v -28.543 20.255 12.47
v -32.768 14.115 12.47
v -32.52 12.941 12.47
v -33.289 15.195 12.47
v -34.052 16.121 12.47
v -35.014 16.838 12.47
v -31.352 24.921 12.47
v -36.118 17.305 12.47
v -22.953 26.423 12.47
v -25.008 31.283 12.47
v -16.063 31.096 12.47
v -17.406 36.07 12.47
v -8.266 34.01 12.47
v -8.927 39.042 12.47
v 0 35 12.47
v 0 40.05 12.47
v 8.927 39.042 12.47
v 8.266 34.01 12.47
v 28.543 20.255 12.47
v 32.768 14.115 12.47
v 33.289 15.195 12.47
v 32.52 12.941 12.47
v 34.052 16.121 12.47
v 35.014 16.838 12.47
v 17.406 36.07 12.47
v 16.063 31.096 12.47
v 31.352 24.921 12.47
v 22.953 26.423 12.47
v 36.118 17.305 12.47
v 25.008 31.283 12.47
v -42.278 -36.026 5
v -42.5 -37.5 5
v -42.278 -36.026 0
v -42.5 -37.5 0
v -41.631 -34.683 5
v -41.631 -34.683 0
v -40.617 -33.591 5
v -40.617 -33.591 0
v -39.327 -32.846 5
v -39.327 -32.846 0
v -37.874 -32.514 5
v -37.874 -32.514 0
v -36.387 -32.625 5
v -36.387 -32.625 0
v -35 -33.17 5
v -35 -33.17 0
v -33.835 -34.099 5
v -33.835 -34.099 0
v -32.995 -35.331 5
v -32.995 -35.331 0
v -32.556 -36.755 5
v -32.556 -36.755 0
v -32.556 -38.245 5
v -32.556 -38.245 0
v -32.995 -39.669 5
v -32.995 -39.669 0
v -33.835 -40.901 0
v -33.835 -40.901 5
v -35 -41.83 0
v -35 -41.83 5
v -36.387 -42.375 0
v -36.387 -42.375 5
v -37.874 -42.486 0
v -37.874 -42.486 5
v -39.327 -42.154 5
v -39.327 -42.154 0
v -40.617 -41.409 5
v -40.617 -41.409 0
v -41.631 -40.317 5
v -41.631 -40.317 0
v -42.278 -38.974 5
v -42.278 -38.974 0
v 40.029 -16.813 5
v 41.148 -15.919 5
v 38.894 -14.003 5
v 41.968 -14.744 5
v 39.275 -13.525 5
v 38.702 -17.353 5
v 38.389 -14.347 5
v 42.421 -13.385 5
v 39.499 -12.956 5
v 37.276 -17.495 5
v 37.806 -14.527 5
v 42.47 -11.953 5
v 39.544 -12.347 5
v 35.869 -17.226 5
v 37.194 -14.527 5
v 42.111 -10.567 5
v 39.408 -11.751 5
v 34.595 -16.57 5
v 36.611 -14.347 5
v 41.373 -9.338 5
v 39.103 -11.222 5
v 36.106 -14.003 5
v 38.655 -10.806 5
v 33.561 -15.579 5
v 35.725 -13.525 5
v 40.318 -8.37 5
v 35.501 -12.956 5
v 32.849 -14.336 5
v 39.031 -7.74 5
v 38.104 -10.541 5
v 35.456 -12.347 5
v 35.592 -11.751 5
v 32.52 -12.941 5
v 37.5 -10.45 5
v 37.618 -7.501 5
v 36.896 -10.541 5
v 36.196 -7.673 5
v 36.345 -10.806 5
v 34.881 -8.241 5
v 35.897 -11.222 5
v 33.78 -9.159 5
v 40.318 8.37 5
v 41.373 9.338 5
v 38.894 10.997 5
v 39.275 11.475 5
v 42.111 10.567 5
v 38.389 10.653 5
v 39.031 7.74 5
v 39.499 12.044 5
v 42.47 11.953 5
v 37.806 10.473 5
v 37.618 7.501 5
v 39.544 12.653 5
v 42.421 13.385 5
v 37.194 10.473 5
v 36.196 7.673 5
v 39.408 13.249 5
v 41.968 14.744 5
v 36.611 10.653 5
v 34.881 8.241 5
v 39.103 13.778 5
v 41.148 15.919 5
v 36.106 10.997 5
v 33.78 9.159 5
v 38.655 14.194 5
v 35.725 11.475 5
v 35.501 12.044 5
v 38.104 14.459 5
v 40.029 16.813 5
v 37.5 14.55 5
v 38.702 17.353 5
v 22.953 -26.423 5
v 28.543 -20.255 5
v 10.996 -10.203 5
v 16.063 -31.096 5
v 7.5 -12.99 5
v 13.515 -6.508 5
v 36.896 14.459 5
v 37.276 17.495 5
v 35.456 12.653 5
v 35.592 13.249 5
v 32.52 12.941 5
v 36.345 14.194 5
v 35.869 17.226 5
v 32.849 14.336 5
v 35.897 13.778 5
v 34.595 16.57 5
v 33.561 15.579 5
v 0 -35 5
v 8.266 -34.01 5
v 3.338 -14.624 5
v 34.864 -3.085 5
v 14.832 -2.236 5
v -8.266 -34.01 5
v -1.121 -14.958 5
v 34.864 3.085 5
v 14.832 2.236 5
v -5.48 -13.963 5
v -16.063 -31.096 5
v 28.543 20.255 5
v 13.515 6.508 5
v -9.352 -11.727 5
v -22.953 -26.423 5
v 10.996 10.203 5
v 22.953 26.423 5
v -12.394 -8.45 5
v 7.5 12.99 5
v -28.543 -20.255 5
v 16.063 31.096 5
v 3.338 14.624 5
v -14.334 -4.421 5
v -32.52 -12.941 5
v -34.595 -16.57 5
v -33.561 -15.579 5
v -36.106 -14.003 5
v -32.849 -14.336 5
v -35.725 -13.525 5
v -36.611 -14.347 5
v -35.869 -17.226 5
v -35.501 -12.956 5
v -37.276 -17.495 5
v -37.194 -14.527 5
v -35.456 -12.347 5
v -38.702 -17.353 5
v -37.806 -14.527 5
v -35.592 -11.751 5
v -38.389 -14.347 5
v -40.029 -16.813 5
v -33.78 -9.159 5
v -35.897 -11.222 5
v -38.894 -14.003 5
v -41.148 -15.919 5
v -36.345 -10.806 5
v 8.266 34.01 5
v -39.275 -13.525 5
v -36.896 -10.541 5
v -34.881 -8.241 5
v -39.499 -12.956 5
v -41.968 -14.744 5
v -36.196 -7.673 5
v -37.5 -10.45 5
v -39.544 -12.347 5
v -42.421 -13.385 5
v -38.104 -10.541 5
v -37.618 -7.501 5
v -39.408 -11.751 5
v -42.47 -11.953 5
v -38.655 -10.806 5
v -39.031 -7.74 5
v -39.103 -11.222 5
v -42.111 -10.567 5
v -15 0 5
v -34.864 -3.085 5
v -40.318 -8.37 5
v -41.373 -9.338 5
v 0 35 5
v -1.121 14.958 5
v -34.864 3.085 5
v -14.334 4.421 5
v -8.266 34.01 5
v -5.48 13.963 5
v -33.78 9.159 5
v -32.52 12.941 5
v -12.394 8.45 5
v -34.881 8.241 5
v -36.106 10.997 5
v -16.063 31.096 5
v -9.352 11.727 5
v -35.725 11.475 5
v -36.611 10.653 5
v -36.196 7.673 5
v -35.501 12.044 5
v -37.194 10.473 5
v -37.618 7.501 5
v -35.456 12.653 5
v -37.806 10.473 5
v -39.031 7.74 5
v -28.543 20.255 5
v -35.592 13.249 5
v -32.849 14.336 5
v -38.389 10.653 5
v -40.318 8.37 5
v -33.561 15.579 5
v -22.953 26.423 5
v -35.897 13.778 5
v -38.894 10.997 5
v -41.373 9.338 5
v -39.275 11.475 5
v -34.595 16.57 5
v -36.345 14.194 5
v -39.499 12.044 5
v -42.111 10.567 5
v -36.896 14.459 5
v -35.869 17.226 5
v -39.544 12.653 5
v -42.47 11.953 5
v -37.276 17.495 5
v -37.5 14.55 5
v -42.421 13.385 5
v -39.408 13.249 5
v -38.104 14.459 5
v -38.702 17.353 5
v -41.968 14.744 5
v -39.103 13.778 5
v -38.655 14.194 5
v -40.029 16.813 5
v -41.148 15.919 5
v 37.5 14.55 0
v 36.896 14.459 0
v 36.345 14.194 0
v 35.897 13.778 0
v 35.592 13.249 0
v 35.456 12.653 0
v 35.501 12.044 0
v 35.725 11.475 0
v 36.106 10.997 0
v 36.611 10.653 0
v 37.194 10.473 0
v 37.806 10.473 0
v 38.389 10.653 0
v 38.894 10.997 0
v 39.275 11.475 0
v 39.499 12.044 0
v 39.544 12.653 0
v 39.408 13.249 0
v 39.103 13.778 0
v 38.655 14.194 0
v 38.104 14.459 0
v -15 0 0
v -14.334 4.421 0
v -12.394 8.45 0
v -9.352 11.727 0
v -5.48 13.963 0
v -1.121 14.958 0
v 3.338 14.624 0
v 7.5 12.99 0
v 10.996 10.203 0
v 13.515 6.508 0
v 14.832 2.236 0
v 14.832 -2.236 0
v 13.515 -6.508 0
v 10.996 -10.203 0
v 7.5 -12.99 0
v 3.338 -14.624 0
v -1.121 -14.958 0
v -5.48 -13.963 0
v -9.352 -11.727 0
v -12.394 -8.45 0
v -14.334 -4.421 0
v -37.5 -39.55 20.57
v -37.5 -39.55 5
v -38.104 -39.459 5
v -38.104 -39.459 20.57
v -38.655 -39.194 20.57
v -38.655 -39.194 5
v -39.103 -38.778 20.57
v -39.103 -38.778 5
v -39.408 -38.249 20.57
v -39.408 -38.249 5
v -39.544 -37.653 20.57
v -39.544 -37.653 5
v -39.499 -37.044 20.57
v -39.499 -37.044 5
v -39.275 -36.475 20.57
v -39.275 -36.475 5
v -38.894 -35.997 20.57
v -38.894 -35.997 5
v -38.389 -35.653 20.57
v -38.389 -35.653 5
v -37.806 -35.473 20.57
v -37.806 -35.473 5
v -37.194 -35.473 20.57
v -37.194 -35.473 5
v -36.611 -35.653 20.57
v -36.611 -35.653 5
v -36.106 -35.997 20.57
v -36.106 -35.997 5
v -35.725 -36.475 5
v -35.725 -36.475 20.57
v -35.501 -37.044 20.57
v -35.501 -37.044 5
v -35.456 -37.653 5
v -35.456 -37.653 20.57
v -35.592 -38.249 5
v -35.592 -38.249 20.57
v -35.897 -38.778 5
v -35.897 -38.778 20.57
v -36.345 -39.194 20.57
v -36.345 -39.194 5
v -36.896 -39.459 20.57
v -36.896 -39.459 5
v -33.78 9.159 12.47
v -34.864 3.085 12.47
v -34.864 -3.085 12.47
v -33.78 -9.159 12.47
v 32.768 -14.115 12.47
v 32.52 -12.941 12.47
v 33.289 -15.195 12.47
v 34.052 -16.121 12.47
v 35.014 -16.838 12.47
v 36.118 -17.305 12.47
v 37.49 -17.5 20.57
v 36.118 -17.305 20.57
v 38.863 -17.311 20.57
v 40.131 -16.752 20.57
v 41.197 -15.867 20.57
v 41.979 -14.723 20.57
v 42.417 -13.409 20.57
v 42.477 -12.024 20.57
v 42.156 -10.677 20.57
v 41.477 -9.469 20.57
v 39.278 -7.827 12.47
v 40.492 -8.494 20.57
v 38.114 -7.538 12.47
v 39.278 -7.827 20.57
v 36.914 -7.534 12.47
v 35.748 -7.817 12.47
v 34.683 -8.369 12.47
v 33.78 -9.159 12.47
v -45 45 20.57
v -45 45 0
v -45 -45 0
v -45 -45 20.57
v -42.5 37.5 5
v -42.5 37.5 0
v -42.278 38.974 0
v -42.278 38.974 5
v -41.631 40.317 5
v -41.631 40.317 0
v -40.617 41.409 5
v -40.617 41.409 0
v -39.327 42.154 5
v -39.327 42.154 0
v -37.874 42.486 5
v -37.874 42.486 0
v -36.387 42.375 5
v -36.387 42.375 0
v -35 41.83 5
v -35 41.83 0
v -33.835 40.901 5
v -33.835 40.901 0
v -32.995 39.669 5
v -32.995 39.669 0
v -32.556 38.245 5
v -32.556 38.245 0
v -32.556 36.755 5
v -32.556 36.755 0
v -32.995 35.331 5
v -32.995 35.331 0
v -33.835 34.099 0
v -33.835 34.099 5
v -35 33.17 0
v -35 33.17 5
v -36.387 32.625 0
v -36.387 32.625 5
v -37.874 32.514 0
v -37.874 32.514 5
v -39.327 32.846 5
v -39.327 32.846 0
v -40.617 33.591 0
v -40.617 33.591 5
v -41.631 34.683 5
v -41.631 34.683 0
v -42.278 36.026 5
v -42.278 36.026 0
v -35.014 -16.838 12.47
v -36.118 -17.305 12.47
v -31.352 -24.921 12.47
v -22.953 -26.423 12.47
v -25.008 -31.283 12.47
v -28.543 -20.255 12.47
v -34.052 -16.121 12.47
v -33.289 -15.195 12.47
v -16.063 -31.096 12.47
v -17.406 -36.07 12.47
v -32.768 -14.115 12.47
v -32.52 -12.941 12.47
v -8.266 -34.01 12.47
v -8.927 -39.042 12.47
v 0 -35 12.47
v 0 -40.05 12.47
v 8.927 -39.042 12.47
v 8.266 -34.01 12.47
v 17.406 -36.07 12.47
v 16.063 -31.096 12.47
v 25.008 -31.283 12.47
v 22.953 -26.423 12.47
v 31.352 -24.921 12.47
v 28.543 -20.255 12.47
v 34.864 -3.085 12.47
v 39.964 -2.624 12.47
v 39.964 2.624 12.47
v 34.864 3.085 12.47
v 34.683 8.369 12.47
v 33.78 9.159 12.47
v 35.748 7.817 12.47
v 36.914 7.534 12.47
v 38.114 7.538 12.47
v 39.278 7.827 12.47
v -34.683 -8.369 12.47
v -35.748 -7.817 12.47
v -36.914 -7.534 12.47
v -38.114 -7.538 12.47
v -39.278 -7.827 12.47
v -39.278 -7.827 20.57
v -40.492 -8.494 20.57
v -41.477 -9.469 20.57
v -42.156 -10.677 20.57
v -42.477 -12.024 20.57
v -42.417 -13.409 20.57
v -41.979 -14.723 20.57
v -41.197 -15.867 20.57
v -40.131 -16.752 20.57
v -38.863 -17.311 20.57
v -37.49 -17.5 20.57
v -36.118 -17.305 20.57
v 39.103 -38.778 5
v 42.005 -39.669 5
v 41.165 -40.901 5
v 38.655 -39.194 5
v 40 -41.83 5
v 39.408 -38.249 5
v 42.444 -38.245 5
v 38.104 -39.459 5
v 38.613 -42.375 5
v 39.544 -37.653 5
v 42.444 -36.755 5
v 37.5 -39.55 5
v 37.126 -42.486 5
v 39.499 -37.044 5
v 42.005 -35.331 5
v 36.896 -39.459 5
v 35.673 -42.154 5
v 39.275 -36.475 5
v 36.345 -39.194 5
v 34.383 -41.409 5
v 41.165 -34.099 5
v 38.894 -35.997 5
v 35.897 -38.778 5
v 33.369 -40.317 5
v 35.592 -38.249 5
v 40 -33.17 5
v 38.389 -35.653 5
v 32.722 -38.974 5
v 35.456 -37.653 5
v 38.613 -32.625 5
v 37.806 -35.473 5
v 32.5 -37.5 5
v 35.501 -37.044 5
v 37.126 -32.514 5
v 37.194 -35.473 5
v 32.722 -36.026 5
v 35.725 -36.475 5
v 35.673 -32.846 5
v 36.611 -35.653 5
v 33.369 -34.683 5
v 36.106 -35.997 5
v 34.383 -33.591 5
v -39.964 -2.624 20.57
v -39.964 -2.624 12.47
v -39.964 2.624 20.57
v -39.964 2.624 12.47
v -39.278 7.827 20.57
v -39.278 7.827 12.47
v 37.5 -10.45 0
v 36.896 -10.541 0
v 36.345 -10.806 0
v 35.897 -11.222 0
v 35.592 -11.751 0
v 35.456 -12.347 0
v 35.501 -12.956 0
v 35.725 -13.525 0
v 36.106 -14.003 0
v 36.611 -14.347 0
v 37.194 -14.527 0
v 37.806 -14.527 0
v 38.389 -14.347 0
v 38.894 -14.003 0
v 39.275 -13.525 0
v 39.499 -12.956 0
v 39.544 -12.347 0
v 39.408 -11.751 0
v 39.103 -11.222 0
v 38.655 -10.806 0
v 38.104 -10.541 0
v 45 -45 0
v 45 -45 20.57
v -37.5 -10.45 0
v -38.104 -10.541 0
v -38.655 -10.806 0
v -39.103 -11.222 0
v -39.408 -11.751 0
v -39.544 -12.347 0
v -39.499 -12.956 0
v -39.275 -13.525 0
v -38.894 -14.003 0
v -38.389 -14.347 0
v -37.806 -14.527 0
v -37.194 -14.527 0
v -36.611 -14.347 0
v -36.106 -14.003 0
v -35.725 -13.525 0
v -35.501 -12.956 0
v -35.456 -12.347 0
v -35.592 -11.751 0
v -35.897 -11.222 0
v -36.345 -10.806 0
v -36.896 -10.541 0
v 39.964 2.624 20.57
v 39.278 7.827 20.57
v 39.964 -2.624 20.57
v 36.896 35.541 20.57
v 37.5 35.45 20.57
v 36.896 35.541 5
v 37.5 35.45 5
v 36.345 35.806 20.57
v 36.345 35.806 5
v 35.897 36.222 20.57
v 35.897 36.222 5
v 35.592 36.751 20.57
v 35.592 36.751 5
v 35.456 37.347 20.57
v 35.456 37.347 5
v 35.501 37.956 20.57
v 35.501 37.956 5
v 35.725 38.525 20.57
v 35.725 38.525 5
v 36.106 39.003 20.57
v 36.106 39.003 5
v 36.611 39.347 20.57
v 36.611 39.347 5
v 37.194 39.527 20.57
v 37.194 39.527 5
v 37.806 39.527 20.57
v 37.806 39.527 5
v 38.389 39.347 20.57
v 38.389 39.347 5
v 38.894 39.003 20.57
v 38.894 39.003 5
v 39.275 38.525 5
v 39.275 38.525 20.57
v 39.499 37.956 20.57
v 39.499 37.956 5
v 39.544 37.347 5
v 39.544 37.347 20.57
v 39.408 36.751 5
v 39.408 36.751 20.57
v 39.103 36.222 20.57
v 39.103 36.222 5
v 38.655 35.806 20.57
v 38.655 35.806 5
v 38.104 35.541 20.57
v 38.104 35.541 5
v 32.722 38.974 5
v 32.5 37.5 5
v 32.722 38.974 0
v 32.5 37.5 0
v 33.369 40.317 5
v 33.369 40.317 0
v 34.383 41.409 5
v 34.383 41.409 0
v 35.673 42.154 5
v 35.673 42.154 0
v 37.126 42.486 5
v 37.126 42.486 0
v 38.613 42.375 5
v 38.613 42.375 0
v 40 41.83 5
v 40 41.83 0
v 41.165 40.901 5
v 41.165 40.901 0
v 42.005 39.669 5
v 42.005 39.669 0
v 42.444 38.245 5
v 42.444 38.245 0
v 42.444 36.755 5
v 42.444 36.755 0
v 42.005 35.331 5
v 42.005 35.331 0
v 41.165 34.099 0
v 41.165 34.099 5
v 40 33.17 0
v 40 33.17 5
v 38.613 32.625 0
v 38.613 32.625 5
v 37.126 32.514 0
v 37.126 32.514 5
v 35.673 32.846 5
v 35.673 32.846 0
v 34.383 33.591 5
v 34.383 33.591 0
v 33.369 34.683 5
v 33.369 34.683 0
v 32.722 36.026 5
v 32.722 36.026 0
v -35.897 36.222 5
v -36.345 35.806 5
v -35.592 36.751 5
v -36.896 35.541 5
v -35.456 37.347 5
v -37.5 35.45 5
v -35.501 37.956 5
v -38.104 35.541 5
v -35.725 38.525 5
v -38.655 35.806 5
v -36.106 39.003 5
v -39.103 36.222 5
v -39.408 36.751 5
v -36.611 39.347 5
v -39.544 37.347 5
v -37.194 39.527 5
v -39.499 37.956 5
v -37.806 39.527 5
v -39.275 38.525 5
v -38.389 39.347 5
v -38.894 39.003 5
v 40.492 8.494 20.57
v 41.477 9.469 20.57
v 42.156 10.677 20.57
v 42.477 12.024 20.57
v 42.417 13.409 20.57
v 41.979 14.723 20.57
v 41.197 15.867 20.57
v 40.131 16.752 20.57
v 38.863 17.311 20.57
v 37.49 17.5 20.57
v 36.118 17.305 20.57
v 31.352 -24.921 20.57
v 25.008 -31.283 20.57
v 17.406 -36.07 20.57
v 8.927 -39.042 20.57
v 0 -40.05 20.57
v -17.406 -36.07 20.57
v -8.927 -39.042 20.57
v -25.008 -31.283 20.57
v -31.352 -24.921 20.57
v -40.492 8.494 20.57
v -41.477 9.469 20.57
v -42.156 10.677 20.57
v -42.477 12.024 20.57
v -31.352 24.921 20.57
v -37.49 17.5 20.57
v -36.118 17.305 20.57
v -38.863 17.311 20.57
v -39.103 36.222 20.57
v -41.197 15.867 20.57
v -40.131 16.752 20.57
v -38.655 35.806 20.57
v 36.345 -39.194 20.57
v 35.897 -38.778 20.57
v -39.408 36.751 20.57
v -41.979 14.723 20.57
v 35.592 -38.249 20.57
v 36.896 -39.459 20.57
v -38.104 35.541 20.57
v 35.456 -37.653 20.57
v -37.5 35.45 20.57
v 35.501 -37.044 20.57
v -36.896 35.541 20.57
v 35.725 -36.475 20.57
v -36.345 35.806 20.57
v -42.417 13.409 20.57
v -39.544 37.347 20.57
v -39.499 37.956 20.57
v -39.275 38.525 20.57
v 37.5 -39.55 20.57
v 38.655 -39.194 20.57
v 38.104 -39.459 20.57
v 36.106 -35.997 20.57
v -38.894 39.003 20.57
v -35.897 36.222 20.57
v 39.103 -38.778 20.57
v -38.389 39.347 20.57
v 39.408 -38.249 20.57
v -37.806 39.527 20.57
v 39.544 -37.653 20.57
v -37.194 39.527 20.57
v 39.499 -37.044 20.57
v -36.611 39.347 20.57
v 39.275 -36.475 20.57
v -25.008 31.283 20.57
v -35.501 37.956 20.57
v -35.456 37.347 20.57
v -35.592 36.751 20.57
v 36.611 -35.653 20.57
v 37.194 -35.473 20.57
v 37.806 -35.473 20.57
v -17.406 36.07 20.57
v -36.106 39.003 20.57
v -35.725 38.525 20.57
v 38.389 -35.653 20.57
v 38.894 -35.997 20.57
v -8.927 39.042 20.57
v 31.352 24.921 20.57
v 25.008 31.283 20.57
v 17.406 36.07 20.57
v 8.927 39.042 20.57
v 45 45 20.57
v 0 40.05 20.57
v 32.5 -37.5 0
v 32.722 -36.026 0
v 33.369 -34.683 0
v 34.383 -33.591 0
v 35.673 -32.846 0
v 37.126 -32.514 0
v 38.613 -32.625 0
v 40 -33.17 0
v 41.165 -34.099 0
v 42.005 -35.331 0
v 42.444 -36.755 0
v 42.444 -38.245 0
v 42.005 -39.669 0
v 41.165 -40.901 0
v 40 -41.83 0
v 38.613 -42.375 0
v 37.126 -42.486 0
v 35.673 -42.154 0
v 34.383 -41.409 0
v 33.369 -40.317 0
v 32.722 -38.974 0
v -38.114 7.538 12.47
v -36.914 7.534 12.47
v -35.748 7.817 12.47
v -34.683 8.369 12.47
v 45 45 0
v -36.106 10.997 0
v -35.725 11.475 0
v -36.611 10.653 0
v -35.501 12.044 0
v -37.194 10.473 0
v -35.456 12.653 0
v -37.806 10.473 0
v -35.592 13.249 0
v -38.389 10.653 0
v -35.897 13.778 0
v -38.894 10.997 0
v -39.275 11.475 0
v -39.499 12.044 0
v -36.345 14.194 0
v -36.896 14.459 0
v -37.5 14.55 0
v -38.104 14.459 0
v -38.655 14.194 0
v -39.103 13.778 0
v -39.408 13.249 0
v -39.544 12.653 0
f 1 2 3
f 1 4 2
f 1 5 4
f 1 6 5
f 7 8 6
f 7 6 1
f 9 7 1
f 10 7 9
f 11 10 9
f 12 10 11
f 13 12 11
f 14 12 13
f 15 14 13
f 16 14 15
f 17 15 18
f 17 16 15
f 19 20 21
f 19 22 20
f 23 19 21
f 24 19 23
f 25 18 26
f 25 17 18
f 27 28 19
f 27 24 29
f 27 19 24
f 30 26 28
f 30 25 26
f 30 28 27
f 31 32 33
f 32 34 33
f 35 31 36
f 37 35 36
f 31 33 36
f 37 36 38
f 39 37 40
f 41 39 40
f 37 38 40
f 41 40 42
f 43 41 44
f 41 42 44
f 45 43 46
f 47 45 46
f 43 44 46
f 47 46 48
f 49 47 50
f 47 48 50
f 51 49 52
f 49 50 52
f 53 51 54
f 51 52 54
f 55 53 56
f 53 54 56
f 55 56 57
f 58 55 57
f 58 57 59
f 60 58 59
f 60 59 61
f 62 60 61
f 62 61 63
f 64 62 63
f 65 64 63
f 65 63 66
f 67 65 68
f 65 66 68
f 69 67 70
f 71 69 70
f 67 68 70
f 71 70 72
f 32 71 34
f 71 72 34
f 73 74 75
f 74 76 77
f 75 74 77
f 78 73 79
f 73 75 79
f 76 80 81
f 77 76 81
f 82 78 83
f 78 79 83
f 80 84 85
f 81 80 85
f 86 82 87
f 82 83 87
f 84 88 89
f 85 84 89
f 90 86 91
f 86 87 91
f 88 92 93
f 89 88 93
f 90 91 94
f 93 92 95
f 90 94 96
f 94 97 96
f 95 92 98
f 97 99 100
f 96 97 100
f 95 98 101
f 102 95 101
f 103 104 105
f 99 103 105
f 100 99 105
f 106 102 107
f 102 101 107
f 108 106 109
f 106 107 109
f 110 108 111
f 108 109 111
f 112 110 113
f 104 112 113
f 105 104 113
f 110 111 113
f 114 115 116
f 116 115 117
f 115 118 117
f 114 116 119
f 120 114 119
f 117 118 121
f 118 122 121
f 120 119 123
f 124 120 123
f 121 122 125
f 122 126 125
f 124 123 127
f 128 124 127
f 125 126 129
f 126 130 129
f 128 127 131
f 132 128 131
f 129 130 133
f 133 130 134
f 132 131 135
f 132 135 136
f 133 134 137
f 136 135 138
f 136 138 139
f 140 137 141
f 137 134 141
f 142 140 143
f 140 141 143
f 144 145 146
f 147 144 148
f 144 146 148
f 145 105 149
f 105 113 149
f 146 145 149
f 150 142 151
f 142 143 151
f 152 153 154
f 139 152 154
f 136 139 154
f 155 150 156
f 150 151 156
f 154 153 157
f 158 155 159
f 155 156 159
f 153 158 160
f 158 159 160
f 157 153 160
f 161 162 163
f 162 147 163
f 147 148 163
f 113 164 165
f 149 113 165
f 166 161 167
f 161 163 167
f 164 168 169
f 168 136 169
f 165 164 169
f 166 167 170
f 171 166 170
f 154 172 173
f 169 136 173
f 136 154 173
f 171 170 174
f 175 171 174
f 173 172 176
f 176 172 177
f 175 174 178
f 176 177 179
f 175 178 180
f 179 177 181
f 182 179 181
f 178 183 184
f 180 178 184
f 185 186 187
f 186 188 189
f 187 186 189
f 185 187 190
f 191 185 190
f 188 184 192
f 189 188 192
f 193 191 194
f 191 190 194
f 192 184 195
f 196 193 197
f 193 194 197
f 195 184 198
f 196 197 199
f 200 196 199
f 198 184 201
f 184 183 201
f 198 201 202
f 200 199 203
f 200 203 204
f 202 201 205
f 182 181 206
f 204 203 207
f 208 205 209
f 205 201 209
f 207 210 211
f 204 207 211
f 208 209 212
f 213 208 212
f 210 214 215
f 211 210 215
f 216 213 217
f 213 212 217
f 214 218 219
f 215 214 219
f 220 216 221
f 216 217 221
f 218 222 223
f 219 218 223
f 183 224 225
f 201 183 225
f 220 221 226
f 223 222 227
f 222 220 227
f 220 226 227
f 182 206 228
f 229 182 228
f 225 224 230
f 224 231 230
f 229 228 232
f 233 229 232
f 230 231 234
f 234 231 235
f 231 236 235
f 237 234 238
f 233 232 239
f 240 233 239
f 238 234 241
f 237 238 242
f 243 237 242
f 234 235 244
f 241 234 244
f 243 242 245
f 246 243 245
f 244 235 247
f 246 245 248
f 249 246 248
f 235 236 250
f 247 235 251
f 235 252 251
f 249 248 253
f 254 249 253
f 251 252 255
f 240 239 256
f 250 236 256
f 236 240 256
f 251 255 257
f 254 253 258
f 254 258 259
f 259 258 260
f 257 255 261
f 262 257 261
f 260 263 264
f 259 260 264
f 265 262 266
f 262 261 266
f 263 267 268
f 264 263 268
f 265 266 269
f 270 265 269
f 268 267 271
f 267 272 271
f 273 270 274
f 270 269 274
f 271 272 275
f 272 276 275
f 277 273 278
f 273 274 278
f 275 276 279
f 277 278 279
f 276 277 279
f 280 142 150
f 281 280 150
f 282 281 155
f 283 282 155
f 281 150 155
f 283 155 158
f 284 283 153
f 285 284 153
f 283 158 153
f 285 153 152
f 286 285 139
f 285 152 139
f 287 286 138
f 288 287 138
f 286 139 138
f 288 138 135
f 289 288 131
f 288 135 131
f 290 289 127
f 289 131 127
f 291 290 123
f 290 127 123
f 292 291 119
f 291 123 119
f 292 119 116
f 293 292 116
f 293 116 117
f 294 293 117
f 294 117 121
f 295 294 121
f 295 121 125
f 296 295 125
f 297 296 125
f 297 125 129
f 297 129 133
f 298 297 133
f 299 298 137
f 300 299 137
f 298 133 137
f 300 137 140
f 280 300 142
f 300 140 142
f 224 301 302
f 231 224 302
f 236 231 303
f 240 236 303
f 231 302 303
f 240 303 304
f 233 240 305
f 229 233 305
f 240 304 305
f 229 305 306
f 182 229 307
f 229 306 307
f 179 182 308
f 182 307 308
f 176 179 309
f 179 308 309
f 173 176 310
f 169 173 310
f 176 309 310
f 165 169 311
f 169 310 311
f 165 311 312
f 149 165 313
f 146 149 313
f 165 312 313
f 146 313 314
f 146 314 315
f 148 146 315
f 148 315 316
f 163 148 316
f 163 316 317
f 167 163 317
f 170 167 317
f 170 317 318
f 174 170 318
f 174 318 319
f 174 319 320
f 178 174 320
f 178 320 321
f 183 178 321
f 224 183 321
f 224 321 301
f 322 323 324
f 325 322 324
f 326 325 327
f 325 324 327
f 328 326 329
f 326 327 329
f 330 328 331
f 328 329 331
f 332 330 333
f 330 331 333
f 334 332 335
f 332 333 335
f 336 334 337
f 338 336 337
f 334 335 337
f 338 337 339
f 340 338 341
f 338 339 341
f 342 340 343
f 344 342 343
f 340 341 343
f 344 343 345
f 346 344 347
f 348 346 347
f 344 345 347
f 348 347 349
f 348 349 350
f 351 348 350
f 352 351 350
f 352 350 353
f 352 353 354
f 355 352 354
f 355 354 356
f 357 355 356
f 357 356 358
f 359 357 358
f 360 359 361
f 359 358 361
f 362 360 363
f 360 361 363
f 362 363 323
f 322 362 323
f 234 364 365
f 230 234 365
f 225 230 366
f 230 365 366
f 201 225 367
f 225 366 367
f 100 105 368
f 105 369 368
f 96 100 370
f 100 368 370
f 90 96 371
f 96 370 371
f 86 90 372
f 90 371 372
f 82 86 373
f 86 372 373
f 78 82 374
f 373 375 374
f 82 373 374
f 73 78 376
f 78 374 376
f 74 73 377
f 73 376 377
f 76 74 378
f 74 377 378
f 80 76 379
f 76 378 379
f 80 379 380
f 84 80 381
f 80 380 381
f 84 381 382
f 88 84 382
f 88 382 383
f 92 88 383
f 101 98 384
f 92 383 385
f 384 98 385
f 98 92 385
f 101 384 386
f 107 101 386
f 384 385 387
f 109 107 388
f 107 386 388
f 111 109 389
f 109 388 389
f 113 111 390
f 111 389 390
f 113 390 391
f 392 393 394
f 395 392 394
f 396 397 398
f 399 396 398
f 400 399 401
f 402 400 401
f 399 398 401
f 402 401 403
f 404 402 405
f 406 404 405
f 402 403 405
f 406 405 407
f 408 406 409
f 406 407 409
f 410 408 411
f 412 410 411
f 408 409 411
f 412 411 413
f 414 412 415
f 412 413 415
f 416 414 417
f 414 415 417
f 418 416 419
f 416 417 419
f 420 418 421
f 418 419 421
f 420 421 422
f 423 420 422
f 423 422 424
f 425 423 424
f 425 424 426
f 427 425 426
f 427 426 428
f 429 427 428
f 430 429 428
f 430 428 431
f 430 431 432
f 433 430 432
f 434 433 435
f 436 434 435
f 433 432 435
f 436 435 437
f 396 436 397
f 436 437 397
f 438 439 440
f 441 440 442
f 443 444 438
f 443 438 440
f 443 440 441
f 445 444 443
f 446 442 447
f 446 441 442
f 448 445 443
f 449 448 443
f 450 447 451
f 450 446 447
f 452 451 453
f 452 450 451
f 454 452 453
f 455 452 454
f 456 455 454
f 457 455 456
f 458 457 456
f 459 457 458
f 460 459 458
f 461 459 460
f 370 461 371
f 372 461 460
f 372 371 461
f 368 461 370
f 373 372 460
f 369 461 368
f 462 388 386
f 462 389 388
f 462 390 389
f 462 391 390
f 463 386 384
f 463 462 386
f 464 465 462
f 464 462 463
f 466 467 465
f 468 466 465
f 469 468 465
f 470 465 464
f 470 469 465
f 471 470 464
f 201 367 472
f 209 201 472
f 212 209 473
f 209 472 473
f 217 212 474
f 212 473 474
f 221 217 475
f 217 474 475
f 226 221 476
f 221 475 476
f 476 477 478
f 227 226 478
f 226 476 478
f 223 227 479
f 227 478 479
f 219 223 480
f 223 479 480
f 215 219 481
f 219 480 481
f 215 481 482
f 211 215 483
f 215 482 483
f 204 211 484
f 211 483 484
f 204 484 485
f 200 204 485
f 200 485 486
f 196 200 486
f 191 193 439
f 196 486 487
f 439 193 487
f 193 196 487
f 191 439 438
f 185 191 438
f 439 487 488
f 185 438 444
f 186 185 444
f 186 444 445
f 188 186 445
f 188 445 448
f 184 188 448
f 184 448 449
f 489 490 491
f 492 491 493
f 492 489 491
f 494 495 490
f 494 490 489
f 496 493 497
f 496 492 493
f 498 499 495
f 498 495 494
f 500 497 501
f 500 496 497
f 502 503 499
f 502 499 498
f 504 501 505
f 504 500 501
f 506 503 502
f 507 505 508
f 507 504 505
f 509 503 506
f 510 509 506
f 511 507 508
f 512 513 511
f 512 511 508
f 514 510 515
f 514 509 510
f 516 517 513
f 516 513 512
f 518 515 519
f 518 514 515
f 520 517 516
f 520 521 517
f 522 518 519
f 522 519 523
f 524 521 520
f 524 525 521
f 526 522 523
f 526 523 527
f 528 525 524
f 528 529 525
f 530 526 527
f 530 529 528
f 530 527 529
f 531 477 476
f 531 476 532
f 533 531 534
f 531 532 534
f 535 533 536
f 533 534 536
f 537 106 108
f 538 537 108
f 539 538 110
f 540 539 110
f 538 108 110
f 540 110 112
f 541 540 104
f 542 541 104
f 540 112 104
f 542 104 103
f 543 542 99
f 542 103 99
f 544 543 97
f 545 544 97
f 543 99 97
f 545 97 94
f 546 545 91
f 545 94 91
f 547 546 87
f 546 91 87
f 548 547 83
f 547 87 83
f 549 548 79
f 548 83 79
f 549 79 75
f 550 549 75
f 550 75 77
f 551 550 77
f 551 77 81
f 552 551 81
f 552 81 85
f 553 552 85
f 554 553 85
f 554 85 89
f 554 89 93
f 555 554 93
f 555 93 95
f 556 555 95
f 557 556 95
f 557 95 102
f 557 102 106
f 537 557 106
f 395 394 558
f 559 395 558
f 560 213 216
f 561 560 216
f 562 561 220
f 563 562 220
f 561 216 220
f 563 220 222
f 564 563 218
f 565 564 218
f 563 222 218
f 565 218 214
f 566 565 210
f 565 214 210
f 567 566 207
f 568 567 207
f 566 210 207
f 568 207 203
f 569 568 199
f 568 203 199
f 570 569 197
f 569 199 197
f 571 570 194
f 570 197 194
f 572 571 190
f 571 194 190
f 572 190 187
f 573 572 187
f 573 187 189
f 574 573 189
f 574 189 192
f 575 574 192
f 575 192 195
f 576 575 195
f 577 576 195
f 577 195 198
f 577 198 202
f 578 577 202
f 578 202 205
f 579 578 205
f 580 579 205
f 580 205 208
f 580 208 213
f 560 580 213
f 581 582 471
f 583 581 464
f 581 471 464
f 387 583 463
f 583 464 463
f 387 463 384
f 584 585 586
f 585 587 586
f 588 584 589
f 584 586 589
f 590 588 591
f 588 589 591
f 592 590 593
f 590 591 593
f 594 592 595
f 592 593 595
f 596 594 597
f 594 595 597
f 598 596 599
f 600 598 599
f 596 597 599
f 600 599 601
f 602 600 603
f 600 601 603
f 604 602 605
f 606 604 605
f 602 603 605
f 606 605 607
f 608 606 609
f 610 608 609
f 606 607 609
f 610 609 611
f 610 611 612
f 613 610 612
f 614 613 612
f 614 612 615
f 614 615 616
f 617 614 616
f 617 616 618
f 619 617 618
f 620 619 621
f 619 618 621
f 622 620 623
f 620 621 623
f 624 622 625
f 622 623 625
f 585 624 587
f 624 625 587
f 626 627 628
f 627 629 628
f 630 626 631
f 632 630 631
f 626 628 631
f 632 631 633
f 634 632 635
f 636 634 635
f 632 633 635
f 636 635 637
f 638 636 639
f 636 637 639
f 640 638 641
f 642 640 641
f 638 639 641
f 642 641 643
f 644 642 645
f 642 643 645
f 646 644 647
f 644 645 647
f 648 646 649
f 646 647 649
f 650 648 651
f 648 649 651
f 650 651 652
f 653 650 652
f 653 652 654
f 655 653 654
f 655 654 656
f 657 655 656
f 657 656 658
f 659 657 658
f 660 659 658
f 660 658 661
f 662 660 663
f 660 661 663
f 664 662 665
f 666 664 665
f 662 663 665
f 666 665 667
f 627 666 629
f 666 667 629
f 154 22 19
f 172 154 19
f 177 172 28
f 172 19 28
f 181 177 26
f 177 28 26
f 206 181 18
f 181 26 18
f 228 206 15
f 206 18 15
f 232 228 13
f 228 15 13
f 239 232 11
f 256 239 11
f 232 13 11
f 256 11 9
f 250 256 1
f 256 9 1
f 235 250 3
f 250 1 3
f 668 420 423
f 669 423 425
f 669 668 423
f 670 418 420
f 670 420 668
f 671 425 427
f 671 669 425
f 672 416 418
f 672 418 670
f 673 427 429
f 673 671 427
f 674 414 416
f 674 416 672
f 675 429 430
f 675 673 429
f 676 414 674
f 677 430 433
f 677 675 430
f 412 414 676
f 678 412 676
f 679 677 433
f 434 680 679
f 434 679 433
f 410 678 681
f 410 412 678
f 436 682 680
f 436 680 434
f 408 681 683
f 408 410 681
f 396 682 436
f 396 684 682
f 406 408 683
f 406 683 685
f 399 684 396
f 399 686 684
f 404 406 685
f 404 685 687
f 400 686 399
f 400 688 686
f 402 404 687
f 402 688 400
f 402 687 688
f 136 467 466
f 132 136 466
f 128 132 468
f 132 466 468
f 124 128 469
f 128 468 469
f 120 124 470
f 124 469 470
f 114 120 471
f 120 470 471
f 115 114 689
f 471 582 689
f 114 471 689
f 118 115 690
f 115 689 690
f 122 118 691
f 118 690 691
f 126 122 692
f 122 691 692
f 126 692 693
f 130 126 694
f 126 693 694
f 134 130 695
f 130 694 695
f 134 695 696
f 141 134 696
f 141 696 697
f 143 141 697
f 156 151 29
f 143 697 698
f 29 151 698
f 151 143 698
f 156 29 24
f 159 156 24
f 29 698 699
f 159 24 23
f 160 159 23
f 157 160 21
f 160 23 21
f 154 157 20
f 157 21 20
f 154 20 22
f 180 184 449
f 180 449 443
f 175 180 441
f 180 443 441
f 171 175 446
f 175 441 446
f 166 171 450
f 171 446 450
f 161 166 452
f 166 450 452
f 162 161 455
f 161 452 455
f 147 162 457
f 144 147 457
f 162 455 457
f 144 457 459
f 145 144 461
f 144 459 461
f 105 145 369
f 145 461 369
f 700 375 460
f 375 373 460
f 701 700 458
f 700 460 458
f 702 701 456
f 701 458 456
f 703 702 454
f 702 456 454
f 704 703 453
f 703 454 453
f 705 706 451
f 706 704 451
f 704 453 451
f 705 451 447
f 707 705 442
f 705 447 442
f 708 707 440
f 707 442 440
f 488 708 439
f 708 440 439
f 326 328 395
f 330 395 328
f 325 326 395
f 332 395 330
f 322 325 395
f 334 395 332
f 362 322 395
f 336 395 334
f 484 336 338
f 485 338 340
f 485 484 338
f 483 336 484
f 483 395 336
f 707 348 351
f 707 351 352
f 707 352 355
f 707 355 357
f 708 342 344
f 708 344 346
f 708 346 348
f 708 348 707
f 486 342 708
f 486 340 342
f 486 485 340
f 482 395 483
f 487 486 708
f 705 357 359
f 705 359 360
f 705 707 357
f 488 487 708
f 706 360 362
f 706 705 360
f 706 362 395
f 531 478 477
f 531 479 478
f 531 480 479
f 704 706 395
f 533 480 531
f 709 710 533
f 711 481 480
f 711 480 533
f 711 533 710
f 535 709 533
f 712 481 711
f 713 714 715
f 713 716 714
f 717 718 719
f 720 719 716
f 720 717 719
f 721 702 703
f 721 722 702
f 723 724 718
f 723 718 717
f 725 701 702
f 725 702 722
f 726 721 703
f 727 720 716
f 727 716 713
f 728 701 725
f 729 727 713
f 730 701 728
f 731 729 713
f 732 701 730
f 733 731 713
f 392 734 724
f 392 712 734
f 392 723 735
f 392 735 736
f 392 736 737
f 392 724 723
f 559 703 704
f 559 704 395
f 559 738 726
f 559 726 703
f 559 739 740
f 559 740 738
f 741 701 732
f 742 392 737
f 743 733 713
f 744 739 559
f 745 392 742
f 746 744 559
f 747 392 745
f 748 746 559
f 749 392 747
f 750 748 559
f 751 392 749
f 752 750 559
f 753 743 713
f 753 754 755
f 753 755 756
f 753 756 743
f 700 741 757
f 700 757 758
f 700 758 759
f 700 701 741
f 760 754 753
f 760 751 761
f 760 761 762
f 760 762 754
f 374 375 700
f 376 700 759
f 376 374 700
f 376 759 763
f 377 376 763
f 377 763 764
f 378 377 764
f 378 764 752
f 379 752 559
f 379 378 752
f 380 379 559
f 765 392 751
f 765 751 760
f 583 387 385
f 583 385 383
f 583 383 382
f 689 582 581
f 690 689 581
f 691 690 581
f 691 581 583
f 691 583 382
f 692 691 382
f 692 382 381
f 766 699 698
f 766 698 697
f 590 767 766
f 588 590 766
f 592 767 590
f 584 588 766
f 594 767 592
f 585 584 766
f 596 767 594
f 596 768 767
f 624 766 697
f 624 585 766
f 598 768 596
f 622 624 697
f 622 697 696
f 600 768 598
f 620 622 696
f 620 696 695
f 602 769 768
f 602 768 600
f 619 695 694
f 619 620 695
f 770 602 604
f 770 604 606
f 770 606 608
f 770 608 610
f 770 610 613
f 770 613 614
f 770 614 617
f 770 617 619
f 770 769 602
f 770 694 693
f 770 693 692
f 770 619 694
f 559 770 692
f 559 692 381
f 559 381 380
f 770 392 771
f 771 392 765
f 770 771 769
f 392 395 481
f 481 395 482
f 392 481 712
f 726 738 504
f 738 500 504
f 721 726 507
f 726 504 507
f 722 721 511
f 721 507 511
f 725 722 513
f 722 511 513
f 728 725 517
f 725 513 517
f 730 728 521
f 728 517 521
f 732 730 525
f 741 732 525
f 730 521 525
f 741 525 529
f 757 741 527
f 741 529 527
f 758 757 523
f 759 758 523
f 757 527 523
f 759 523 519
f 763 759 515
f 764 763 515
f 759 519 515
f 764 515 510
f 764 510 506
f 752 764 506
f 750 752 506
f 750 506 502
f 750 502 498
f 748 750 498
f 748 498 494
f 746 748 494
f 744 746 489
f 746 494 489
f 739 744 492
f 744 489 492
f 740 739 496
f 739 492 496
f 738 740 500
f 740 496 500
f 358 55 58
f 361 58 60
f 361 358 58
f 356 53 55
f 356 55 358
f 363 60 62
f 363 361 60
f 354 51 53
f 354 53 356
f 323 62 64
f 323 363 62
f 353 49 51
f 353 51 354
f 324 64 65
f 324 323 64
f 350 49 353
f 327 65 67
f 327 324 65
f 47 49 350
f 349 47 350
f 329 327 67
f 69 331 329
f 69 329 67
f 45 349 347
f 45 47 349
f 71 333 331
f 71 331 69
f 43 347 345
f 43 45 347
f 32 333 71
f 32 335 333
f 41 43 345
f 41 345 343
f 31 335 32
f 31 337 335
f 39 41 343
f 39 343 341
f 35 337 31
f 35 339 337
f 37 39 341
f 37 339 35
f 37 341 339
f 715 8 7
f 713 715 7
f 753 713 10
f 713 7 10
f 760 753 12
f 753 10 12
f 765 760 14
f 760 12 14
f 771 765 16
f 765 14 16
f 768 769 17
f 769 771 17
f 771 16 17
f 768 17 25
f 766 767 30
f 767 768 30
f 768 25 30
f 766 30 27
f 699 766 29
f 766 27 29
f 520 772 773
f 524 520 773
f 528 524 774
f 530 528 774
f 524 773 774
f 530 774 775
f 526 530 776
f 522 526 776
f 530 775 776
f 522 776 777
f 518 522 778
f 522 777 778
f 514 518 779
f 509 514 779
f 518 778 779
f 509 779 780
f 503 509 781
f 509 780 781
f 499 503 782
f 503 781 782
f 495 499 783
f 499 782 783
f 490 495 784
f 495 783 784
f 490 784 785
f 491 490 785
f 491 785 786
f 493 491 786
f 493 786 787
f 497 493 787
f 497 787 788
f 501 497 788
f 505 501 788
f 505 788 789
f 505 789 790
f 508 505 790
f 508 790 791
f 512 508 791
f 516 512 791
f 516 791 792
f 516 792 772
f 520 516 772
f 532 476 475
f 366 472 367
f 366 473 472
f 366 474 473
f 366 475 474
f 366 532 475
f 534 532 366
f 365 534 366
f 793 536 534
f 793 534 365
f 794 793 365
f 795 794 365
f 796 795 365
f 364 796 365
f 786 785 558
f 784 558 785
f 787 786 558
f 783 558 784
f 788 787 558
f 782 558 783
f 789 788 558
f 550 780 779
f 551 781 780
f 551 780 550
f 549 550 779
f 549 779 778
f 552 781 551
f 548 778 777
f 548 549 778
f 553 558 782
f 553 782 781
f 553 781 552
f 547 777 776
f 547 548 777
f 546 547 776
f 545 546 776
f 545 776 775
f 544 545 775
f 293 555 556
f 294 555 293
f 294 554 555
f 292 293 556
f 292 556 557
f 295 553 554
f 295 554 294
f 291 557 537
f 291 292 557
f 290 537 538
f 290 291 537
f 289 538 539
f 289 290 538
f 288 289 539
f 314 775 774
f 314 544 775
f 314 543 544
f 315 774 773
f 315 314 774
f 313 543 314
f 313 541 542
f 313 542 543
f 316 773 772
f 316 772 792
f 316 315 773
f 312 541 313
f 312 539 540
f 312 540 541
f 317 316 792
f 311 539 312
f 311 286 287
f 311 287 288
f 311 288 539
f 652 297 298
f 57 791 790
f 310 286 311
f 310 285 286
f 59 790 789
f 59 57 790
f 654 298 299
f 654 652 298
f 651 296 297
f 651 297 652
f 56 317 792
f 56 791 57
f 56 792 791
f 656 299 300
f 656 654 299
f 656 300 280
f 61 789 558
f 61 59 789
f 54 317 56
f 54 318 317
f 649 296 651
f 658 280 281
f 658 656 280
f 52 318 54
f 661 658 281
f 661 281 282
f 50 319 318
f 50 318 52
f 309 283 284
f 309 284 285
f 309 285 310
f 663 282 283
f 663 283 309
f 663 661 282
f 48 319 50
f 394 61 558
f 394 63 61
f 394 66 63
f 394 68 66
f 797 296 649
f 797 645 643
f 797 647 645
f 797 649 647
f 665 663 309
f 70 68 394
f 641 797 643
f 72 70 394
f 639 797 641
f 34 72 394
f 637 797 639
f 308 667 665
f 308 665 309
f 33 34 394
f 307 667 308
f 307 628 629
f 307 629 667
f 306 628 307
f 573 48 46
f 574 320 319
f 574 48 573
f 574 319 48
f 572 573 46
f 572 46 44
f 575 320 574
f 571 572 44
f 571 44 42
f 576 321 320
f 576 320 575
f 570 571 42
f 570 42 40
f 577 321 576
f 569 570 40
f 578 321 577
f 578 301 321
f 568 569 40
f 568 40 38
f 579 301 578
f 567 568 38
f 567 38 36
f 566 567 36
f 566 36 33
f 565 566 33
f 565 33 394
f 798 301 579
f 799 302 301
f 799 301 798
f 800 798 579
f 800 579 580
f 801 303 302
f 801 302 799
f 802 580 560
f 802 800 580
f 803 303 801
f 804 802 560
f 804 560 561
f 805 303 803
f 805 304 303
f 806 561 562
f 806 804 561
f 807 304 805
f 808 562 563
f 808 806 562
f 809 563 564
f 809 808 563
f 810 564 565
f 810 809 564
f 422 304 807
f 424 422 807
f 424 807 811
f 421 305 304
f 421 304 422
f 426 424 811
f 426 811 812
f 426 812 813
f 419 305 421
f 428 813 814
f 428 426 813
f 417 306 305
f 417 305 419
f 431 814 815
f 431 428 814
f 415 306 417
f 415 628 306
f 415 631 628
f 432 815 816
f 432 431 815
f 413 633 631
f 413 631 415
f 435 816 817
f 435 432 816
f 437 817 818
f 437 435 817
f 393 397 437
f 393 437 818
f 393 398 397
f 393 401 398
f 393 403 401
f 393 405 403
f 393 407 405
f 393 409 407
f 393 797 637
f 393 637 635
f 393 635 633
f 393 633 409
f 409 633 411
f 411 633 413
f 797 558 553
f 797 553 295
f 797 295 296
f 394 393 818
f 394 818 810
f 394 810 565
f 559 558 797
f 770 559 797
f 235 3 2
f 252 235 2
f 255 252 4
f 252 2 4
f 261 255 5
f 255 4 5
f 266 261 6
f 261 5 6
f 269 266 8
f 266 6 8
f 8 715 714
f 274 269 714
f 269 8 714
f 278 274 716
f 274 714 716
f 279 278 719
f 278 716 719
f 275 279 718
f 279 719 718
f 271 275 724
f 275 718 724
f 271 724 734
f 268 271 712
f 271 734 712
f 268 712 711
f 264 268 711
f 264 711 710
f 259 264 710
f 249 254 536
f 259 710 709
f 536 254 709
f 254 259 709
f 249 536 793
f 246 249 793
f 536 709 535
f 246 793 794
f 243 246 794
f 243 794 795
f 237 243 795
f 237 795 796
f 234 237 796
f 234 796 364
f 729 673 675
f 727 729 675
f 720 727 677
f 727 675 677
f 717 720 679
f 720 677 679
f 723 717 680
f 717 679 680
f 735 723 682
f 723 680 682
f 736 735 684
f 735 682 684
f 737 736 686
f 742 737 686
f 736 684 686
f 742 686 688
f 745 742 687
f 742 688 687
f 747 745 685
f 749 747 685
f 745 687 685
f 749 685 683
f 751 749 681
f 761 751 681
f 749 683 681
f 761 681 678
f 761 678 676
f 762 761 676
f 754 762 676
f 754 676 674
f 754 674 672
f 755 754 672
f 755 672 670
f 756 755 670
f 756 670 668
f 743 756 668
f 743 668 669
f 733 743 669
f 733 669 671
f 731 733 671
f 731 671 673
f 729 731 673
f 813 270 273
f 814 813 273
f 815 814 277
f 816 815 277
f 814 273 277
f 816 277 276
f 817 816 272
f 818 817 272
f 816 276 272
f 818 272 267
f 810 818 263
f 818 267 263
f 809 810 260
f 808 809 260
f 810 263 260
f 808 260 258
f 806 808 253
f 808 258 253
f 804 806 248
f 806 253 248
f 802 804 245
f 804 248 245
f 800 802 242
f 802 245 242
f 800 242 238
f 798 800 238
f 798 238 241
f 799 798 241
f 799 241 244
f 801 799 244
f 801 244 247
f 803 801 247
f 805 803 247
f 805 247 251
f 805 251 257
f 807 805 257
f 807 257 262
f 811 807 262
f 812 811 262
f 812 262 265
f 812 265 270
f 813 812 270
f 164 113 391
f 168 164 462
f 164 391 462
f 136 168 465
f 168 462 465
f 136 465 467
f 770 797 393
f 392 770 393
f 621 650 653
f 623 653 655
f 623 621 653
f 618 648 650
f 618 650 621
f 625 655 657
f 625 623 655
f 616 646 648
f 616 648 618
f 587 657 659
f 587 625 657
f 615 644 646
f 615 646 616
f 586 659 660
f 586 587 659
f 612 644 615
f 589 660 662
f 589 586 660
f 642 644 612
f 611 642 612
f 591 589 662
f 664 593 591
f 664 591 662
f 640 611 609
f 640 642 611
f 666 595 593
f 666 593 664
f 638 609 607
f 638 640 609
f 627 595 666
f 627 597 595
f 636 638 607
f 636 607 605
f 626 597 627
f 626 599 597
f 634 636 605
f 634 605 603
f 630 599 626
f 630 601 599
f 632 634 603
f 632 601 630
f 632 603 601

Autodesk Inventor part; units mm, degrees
ref_plane "YZ Plane" through (0, 0, 0) normal (1, 0, 0) x (0, 1, 0)
ref_plane "XZ Plane" through (0, 0, 0) normal (0, 1, 0) x (-1, 0, 0)
ref_plane "XY Plane" through (0, 0, 0) normal (0, 0, 1) x (1, 0, 0)
sketch "Sketch4" plane through (0, 0, 0) normal (0, 0, 1) x (1, 0, 0)
  line L0 (-45, -45) -> (45, -45)
  line L1 (45, -45) -> (45, 45)
  line L2 (45, 45) -> (-45, 45)
  line L3 (-45, 45) -> (-45, -45)
  line L4 (-45, -45) -> (45, 45) construction
  line L5 (45, -45) -> (-45, 45) construction
  point P0 (0, 0)
  dimension "d10" = 90
  dimension "d11" = 90
extrude "Extrusion4" add sketch "Sketch4" along normal blind 12.47
sketch "Sketch5" plane through (0, 0, 12.47) normal (0, 0, 1) x (1, 0, 0)
  line L0 (-45, -45) -> (45, -45)
  line L1 (45, -45) -> (45, 45)
  line L2 (45, 45) -> (-45, 45)
  line L3 (-45, 45) -> (-45, -45)
  line L4 (-45, -45) -> (45, 45) construction
  line L5 (45, -45) -> (-45, 45) construction
  line L6 (45, 45) -> (-45, 45) projected
  line L7 (45, -45) -> (45, 45) projected
  circle A0 centre (0, 0) radius 40.05
  dimension "d14" = 80.1
extrude "Extrusion5" add sketch "Sketch5" along normal blind 8.1
sketch "Sketch6" plane through (0, 0, 12.47) normal (0, 0, 1) x (1, 0, 0)
  circle A0 centre (0, 0) radius 35
  dimension "d17" = 70
extrude "Extrusion6" cut sketch "Sketch6" against normal through all
sketch "Sketch7" plane through (0, 0, 0) normal (0, 0, -1) x (-1, 0, 0)
  circle A0 centre (0, 0) radius 35
  circle A1 centre (0, 0) radius 35 projected
  circle A2 centre (0, 0) radius 15
  dimension "d20" = 70
  dimension "d21" = 30
extrude "Extrusion7" add sketch "Sketch7" against normal blind 5
sketch "Sketch8" plane through (0, 0, 0) normal (0, 0, -1) x (-1, 0, 0)
  circle A0 centre (-37.5, -12.5) radius 2.05 projected
  circle A1 centre (-37.5, 12.5) radius 2.05 projected
  circle A2 centre (37.5, -12.5) radius 2.05 projected
  circle A3 centre (37.5, 12.5) radius 2.05 projected
  point P0 (0, 0)
hole "Hole1" at (-37.5, -12.5, 0) at (-37.5, 12.5, 0) at (37.5, -12.5, 0) at (37.5, 12.5, 0) direction (0, 0, 1) diameter 4.1 end through all
sketch "Sketch9" plane through (0, 0, 20.57) normal (0, 0, 1) x (1, 0, 0)
  arc A0 (-38.5785, -10.7566) -> (-37.3167, -14.5418) centre (-37.5, -12.5) ccw projected
  arc A1 (-37.3167, 14.5418) -> (-38.5785, 10.7566) centre (-37.5, 12.5) ccw projected
  arc A2 (38.5785, 10.7566) -> (37.3167, 14.5418) centre (37.5, 12.5) ccw projected
  arc A3 (37.3167, -14.5418) -> (38.5785, -10.7566) centre (37.5, -12.5) ccw projected
  circle A4 centre (-37.5, -12.5) radius 5
  circle A5 centre (-37.5, 12.5) radius 5
  circle A6 centre (37.5, 12.5) radius 5
  circle A7 centre (37.5, -12.5) radius 5
  point P0 (0, 0)
  dimension "d31" = 10
  dimension "d32" = 10
  dimension "d33" = 10
  dimension "d34" = 10
extrude "Extrusion8" cut sketch "Sketch9" against normal blind 15.57
sketch "Sketch10" plane through (0, 0, 20.57) normal (0, 0, 1) x (1, 0, 0)
  circle A0 centre (-37.5, -37.5) radius 2.05 projected
  circle A1 centre (37.5, -37.5) radius 2.05 projected
  circle A2 centre (37.5, 37.5) radius 2.05 projected
  circle A3 centre (-37.5, 37.5) radius 2.05 projected
  circle A4 centre (37.5, -37.5) radius 2.05 projected
  circle A5 centre (-37.5, -37.5) radius 2.05 projected
  line L0 (-45, -45) -> (-45, 45) projected
  line L1 (-45, 45) -> (45, 45) projected
  line L2 (45, 45) -> (45, -45) projected
  line L3 (45, -45) -> (-45, -45) projected
  circle A6 centre (0, 0) radius 40.05 projected
  point P0 (0, 0)
hole "Hole2" at (-37.5, -37.5, 20.57) at (-37.5, 37.5, 20.57) at (37.5, 37.5, 20.57) at (37.5, -37.5, 20.57) direction (0, 0, -1) diameter 4.1 end through all
sketch "Sketch11" plane through (0, 0, 0) normal (0, 0, -1) x (-1, 0, 0)
  circle A0 centre (37.5, 37.5) radius 2.05 projected
  circle A1 centre (37.5, -37.5) radius 2.05 projected
  circle A2 centre (-37.5, -37.5) radius 2.05 projected
  circle A3 centre (-37.5, 37.5) radius 2.05 projected
  circle A4 centre (37.5, -37.5) radius 5
  circle A5 centre (-37.5, -37.5) radius 5
  circle A6 centre (-37.5, 37.5) radius 5
  circle A7 centre (37.5, 37.5) radius 5
  point P0 (0, 0)
  dimension "d44" = 10
  dimension "d45" = 10
  dimension "d46" = 10
  dimension "d47" = 10
extrude "Extrusion9" cut sketch "Sketch11" against normal blind 5
properties part number "bearing_bracket1" material "ABS Plastic"
